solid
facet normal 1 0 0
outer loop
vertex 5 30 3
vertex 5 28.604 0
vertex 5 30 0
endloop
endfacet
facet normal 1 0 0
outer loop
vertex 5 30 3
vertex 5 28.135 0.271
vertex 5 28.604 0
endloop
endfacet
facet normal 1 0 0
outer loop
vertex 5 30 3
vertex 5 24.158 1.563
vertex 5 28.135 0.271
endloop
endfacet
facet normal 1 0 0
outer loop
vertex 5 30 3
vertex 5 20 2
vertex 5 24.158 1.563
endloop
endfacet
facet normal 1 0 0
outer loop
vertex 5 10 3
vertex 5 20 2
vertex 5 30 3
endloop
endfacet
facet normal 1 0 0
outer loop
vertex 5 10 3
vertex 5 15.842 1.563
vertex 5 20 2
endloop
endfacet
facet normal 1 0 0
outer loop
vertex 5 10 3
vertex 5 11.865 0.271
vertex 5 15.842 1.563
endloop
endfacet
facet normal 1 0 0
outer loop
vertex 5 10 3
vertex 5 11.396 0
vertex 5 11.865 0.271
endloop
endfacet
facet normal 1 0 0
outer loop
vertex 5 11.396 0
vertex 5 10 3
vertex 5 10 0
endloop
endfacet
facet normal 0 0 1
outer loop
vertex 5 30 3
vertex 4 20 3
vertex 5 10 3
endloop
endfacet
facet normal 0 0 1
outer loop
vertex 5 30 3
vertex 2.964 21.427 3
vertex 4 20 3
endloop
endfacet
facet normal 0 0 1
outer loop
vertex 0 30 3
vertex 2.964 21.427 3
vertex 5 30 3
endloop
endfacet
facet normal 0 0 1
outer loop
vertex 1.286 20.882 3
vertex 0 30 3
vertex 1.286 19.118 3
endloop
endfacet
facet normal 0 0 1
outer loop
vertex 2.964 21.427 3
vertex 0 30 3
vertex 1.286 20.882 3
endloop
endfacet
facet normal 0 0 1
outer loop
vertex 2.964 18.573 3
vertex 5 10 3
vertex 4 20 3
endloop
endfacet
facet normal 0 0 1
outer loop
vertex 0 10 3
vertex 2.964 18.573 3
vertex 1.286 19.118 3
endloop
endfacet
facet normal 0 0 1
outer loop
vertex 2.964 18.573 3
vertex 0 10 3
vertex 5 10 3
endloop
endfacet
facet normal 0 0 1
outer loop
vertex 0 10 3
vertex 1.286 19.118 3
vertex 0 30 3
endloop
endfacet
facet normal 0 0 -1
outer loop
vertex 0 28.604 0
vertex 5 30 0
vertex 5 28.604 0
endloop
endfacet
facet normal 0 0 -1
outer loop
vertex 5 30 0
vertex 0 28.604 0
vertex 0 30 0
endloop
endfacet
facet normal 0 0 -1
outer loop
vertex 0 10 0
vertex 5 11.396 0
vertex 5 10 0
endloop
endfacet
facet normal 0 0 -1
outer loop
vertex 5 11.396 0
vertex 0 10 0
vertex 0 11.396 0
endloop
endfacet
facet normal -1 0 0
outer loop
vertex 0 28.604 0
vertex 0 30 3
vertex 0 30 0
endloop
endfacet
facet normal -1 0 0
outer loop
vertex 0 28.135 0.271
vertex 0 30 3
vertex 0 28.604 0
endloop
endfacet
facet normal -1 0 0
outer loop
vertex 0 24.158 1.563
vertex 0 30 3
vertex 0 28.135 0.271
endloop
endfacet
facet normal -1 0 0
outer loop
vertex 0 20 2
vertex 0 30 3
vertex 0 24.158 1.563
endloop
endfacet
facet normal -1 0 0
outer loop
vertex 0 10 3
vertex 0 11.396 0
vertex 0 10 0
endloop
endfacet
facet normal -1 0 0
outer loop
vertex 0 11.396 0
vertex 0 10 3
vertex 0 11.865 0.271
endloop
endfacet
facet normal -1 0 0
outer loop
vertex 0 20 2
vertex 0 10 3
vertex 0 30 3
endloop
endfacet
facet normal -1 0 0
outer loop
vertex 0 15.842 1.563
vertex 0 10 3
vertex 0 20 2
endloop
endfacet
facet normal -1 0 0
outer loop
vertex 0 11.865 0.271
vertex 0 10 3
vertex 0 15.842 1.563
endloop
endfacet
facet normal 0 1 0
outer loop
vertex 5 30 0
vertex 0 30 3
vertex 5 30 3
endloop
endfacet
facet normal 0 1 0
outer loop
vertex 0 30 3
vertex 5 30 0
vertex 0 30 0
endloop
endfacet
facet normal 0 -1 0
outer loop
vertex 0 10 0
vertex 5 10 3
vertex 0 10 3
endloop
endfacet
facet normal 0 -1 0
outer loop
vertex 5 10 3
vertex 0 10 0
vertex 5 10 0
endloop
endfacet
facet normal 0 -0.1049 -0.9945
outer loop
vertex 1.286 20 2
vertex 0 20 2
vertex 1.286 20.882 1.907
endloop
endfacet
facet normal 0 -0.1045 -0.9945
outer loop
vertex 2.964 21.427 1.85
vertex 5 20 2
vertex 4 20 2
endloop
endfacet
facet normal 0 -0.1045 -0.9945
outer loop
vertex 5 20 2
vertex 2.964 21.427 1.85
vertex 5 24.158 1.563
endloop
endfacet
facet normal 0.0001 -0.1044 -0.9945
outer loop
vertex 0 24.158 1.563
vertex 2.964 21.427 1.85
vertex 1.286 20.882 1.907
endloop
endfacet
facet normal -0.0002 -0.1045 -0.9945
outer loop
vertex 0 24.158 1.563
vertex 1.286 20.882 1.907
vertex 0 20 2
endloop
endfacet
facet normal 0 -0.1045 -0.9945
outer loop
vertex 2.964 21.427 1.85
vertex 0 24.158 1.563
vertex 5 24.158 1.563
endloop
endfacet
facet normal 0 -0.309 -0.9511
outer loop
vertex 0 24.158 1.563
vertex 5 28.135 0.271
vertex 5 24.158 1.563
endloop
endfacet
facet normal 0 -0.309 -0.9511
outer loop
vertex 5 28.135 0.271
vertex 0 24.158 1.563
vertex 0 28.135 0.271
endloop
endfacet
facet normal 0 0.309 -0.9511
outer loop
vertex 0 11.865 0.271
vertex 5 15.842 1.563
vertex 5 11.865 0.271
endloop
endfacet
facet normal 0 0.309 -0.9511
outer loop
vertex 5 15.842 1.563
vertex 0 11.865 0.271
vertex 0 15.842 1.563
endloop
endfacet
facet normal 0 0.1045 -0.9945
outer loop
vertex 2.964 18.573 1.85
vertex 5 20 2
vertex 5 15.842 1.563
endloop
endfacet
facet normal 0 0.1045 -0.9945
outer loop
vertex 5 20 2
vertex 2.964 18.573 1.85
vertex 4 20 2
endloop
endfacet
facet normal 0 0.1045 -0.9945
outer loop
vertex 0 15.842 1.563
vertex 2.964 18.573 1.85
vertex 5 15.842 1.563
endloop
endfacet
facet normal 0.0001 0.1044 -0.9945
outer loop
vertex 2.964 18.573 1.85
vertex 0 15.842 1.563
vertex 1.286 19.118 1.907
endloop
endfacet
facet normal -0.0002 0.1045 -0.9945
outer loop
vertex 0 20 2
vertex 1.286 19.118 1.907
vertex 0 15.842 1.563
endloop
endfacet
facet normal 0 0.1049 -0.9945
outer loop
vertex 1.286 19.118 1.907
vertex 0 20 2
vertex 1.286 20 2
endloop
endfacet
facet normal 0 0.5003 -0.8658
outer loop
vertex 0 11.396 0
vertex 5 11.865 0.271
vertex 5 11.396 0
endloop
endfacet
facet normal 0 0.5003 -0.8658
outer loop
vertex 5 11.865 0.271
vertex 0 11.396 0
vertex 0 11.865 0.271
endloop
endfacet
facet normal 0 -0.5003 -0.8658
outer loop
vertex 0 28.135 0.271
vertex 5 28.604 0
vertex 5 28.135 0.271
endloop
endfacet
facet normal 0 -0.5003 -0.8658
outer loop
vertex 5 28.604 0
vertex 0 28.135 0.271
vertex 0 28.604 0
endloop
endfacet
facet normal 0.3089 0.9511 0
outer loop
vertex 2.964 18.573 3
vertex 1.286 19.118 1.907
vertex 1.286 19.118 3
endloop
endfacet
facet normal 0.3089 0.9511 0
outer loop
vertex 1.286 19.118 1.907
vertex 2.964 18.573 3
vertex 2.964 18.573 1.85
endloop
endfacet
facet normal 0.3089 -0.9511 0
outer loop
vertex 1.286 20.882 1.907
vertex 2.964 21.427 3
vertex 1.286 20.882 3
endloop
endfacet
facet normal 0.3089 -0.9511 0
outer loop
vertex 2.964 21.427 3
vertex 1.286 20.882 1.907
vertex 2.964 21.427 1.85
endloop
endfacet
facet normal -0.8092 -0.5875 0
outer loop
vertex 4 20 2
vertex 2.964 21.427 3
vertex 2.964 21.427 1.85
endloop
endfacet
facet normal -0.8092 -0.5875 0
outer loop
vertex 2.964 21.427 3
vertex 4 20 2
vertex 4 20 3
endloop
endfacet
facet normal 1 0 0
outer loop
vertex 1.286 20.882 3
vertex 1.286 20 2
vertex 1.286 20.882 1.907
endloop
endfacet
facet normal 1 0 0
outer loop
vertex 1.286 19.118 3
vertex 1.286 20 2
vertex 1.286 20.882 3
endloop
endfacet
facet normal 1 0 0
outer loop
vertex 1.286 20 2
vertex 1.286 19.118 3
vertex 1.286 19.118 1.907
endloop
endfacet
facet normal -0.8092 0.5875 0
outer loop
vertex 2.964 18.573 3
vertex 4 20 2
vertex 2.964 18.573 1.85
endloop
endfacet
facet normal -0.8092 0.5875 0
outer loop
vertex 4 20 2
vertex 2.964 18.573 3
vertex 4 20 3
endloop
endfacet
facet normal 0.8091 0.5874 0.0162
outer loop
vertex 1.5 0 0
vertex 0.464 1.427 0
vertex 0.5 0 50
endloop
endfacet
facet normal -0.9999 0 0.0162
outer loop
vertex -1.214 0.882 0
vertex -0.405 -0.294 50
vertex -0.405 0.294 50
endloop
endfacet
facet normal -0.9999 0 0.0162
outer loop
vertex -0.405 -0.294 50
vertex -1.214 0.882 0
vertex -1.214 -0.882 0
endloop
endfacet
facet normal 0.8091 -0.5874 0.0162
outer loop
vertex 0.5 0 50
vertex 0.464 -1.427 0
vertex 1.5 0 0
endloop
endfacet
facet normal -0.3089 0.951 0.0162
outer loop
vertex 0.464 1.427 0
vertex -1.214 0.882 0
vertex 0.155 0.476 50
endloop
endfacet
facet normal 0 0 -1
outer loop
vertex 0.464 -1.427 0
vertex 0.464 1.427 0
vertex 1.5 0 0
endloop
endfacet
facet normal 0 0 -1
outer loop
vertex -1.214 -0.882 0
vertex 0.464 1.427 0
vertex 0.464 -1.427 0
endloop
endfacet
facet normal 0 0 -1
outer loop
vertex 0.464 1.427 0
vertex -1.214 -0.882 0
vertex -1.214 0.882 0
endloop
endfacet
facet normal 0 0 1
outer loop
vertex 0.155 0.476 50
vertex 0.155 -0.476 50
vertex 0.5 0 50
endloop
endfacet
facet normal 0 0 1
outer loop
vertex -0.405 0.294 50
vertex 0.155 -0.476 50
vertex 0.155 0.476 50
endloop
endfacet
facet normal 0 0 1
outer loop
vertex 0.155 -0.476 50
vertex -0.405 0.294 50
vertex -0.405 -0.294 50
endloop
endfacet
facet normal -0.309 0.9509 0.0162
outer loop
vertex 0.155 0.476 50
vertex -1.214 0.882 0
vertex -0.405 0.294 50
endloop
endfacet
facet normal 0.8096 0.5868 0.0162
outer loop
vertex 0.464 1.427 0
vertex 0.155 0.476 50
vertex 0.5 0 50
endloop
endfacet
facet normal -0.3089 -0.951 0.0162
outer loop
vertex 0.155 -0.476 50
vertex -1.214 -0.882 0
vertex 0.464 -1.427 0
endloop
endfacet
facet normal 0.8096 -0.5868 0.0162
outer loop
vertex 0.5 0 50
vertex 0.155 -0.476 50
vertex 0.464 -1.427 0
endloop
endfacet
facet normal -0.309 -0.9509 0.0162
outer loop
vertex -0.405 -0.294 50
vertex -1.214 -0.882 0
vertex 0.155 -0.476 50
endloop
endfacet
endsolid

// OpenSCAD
difference()
{
    //Base
    translate([0,10,0])
        {
        cube([5,20,3]);
        }
   //Cutout
    translate([-3,20,-18])
    {
        rotate([0,90,0])
        {
        cylinder(20,20,20);
        }

    }
    //Hole
        translate([2.5,20,0])
     {
         cylinder(10,1.5,1.5);
     }
}
//Stick
cylinder(50,1.5,.5);
